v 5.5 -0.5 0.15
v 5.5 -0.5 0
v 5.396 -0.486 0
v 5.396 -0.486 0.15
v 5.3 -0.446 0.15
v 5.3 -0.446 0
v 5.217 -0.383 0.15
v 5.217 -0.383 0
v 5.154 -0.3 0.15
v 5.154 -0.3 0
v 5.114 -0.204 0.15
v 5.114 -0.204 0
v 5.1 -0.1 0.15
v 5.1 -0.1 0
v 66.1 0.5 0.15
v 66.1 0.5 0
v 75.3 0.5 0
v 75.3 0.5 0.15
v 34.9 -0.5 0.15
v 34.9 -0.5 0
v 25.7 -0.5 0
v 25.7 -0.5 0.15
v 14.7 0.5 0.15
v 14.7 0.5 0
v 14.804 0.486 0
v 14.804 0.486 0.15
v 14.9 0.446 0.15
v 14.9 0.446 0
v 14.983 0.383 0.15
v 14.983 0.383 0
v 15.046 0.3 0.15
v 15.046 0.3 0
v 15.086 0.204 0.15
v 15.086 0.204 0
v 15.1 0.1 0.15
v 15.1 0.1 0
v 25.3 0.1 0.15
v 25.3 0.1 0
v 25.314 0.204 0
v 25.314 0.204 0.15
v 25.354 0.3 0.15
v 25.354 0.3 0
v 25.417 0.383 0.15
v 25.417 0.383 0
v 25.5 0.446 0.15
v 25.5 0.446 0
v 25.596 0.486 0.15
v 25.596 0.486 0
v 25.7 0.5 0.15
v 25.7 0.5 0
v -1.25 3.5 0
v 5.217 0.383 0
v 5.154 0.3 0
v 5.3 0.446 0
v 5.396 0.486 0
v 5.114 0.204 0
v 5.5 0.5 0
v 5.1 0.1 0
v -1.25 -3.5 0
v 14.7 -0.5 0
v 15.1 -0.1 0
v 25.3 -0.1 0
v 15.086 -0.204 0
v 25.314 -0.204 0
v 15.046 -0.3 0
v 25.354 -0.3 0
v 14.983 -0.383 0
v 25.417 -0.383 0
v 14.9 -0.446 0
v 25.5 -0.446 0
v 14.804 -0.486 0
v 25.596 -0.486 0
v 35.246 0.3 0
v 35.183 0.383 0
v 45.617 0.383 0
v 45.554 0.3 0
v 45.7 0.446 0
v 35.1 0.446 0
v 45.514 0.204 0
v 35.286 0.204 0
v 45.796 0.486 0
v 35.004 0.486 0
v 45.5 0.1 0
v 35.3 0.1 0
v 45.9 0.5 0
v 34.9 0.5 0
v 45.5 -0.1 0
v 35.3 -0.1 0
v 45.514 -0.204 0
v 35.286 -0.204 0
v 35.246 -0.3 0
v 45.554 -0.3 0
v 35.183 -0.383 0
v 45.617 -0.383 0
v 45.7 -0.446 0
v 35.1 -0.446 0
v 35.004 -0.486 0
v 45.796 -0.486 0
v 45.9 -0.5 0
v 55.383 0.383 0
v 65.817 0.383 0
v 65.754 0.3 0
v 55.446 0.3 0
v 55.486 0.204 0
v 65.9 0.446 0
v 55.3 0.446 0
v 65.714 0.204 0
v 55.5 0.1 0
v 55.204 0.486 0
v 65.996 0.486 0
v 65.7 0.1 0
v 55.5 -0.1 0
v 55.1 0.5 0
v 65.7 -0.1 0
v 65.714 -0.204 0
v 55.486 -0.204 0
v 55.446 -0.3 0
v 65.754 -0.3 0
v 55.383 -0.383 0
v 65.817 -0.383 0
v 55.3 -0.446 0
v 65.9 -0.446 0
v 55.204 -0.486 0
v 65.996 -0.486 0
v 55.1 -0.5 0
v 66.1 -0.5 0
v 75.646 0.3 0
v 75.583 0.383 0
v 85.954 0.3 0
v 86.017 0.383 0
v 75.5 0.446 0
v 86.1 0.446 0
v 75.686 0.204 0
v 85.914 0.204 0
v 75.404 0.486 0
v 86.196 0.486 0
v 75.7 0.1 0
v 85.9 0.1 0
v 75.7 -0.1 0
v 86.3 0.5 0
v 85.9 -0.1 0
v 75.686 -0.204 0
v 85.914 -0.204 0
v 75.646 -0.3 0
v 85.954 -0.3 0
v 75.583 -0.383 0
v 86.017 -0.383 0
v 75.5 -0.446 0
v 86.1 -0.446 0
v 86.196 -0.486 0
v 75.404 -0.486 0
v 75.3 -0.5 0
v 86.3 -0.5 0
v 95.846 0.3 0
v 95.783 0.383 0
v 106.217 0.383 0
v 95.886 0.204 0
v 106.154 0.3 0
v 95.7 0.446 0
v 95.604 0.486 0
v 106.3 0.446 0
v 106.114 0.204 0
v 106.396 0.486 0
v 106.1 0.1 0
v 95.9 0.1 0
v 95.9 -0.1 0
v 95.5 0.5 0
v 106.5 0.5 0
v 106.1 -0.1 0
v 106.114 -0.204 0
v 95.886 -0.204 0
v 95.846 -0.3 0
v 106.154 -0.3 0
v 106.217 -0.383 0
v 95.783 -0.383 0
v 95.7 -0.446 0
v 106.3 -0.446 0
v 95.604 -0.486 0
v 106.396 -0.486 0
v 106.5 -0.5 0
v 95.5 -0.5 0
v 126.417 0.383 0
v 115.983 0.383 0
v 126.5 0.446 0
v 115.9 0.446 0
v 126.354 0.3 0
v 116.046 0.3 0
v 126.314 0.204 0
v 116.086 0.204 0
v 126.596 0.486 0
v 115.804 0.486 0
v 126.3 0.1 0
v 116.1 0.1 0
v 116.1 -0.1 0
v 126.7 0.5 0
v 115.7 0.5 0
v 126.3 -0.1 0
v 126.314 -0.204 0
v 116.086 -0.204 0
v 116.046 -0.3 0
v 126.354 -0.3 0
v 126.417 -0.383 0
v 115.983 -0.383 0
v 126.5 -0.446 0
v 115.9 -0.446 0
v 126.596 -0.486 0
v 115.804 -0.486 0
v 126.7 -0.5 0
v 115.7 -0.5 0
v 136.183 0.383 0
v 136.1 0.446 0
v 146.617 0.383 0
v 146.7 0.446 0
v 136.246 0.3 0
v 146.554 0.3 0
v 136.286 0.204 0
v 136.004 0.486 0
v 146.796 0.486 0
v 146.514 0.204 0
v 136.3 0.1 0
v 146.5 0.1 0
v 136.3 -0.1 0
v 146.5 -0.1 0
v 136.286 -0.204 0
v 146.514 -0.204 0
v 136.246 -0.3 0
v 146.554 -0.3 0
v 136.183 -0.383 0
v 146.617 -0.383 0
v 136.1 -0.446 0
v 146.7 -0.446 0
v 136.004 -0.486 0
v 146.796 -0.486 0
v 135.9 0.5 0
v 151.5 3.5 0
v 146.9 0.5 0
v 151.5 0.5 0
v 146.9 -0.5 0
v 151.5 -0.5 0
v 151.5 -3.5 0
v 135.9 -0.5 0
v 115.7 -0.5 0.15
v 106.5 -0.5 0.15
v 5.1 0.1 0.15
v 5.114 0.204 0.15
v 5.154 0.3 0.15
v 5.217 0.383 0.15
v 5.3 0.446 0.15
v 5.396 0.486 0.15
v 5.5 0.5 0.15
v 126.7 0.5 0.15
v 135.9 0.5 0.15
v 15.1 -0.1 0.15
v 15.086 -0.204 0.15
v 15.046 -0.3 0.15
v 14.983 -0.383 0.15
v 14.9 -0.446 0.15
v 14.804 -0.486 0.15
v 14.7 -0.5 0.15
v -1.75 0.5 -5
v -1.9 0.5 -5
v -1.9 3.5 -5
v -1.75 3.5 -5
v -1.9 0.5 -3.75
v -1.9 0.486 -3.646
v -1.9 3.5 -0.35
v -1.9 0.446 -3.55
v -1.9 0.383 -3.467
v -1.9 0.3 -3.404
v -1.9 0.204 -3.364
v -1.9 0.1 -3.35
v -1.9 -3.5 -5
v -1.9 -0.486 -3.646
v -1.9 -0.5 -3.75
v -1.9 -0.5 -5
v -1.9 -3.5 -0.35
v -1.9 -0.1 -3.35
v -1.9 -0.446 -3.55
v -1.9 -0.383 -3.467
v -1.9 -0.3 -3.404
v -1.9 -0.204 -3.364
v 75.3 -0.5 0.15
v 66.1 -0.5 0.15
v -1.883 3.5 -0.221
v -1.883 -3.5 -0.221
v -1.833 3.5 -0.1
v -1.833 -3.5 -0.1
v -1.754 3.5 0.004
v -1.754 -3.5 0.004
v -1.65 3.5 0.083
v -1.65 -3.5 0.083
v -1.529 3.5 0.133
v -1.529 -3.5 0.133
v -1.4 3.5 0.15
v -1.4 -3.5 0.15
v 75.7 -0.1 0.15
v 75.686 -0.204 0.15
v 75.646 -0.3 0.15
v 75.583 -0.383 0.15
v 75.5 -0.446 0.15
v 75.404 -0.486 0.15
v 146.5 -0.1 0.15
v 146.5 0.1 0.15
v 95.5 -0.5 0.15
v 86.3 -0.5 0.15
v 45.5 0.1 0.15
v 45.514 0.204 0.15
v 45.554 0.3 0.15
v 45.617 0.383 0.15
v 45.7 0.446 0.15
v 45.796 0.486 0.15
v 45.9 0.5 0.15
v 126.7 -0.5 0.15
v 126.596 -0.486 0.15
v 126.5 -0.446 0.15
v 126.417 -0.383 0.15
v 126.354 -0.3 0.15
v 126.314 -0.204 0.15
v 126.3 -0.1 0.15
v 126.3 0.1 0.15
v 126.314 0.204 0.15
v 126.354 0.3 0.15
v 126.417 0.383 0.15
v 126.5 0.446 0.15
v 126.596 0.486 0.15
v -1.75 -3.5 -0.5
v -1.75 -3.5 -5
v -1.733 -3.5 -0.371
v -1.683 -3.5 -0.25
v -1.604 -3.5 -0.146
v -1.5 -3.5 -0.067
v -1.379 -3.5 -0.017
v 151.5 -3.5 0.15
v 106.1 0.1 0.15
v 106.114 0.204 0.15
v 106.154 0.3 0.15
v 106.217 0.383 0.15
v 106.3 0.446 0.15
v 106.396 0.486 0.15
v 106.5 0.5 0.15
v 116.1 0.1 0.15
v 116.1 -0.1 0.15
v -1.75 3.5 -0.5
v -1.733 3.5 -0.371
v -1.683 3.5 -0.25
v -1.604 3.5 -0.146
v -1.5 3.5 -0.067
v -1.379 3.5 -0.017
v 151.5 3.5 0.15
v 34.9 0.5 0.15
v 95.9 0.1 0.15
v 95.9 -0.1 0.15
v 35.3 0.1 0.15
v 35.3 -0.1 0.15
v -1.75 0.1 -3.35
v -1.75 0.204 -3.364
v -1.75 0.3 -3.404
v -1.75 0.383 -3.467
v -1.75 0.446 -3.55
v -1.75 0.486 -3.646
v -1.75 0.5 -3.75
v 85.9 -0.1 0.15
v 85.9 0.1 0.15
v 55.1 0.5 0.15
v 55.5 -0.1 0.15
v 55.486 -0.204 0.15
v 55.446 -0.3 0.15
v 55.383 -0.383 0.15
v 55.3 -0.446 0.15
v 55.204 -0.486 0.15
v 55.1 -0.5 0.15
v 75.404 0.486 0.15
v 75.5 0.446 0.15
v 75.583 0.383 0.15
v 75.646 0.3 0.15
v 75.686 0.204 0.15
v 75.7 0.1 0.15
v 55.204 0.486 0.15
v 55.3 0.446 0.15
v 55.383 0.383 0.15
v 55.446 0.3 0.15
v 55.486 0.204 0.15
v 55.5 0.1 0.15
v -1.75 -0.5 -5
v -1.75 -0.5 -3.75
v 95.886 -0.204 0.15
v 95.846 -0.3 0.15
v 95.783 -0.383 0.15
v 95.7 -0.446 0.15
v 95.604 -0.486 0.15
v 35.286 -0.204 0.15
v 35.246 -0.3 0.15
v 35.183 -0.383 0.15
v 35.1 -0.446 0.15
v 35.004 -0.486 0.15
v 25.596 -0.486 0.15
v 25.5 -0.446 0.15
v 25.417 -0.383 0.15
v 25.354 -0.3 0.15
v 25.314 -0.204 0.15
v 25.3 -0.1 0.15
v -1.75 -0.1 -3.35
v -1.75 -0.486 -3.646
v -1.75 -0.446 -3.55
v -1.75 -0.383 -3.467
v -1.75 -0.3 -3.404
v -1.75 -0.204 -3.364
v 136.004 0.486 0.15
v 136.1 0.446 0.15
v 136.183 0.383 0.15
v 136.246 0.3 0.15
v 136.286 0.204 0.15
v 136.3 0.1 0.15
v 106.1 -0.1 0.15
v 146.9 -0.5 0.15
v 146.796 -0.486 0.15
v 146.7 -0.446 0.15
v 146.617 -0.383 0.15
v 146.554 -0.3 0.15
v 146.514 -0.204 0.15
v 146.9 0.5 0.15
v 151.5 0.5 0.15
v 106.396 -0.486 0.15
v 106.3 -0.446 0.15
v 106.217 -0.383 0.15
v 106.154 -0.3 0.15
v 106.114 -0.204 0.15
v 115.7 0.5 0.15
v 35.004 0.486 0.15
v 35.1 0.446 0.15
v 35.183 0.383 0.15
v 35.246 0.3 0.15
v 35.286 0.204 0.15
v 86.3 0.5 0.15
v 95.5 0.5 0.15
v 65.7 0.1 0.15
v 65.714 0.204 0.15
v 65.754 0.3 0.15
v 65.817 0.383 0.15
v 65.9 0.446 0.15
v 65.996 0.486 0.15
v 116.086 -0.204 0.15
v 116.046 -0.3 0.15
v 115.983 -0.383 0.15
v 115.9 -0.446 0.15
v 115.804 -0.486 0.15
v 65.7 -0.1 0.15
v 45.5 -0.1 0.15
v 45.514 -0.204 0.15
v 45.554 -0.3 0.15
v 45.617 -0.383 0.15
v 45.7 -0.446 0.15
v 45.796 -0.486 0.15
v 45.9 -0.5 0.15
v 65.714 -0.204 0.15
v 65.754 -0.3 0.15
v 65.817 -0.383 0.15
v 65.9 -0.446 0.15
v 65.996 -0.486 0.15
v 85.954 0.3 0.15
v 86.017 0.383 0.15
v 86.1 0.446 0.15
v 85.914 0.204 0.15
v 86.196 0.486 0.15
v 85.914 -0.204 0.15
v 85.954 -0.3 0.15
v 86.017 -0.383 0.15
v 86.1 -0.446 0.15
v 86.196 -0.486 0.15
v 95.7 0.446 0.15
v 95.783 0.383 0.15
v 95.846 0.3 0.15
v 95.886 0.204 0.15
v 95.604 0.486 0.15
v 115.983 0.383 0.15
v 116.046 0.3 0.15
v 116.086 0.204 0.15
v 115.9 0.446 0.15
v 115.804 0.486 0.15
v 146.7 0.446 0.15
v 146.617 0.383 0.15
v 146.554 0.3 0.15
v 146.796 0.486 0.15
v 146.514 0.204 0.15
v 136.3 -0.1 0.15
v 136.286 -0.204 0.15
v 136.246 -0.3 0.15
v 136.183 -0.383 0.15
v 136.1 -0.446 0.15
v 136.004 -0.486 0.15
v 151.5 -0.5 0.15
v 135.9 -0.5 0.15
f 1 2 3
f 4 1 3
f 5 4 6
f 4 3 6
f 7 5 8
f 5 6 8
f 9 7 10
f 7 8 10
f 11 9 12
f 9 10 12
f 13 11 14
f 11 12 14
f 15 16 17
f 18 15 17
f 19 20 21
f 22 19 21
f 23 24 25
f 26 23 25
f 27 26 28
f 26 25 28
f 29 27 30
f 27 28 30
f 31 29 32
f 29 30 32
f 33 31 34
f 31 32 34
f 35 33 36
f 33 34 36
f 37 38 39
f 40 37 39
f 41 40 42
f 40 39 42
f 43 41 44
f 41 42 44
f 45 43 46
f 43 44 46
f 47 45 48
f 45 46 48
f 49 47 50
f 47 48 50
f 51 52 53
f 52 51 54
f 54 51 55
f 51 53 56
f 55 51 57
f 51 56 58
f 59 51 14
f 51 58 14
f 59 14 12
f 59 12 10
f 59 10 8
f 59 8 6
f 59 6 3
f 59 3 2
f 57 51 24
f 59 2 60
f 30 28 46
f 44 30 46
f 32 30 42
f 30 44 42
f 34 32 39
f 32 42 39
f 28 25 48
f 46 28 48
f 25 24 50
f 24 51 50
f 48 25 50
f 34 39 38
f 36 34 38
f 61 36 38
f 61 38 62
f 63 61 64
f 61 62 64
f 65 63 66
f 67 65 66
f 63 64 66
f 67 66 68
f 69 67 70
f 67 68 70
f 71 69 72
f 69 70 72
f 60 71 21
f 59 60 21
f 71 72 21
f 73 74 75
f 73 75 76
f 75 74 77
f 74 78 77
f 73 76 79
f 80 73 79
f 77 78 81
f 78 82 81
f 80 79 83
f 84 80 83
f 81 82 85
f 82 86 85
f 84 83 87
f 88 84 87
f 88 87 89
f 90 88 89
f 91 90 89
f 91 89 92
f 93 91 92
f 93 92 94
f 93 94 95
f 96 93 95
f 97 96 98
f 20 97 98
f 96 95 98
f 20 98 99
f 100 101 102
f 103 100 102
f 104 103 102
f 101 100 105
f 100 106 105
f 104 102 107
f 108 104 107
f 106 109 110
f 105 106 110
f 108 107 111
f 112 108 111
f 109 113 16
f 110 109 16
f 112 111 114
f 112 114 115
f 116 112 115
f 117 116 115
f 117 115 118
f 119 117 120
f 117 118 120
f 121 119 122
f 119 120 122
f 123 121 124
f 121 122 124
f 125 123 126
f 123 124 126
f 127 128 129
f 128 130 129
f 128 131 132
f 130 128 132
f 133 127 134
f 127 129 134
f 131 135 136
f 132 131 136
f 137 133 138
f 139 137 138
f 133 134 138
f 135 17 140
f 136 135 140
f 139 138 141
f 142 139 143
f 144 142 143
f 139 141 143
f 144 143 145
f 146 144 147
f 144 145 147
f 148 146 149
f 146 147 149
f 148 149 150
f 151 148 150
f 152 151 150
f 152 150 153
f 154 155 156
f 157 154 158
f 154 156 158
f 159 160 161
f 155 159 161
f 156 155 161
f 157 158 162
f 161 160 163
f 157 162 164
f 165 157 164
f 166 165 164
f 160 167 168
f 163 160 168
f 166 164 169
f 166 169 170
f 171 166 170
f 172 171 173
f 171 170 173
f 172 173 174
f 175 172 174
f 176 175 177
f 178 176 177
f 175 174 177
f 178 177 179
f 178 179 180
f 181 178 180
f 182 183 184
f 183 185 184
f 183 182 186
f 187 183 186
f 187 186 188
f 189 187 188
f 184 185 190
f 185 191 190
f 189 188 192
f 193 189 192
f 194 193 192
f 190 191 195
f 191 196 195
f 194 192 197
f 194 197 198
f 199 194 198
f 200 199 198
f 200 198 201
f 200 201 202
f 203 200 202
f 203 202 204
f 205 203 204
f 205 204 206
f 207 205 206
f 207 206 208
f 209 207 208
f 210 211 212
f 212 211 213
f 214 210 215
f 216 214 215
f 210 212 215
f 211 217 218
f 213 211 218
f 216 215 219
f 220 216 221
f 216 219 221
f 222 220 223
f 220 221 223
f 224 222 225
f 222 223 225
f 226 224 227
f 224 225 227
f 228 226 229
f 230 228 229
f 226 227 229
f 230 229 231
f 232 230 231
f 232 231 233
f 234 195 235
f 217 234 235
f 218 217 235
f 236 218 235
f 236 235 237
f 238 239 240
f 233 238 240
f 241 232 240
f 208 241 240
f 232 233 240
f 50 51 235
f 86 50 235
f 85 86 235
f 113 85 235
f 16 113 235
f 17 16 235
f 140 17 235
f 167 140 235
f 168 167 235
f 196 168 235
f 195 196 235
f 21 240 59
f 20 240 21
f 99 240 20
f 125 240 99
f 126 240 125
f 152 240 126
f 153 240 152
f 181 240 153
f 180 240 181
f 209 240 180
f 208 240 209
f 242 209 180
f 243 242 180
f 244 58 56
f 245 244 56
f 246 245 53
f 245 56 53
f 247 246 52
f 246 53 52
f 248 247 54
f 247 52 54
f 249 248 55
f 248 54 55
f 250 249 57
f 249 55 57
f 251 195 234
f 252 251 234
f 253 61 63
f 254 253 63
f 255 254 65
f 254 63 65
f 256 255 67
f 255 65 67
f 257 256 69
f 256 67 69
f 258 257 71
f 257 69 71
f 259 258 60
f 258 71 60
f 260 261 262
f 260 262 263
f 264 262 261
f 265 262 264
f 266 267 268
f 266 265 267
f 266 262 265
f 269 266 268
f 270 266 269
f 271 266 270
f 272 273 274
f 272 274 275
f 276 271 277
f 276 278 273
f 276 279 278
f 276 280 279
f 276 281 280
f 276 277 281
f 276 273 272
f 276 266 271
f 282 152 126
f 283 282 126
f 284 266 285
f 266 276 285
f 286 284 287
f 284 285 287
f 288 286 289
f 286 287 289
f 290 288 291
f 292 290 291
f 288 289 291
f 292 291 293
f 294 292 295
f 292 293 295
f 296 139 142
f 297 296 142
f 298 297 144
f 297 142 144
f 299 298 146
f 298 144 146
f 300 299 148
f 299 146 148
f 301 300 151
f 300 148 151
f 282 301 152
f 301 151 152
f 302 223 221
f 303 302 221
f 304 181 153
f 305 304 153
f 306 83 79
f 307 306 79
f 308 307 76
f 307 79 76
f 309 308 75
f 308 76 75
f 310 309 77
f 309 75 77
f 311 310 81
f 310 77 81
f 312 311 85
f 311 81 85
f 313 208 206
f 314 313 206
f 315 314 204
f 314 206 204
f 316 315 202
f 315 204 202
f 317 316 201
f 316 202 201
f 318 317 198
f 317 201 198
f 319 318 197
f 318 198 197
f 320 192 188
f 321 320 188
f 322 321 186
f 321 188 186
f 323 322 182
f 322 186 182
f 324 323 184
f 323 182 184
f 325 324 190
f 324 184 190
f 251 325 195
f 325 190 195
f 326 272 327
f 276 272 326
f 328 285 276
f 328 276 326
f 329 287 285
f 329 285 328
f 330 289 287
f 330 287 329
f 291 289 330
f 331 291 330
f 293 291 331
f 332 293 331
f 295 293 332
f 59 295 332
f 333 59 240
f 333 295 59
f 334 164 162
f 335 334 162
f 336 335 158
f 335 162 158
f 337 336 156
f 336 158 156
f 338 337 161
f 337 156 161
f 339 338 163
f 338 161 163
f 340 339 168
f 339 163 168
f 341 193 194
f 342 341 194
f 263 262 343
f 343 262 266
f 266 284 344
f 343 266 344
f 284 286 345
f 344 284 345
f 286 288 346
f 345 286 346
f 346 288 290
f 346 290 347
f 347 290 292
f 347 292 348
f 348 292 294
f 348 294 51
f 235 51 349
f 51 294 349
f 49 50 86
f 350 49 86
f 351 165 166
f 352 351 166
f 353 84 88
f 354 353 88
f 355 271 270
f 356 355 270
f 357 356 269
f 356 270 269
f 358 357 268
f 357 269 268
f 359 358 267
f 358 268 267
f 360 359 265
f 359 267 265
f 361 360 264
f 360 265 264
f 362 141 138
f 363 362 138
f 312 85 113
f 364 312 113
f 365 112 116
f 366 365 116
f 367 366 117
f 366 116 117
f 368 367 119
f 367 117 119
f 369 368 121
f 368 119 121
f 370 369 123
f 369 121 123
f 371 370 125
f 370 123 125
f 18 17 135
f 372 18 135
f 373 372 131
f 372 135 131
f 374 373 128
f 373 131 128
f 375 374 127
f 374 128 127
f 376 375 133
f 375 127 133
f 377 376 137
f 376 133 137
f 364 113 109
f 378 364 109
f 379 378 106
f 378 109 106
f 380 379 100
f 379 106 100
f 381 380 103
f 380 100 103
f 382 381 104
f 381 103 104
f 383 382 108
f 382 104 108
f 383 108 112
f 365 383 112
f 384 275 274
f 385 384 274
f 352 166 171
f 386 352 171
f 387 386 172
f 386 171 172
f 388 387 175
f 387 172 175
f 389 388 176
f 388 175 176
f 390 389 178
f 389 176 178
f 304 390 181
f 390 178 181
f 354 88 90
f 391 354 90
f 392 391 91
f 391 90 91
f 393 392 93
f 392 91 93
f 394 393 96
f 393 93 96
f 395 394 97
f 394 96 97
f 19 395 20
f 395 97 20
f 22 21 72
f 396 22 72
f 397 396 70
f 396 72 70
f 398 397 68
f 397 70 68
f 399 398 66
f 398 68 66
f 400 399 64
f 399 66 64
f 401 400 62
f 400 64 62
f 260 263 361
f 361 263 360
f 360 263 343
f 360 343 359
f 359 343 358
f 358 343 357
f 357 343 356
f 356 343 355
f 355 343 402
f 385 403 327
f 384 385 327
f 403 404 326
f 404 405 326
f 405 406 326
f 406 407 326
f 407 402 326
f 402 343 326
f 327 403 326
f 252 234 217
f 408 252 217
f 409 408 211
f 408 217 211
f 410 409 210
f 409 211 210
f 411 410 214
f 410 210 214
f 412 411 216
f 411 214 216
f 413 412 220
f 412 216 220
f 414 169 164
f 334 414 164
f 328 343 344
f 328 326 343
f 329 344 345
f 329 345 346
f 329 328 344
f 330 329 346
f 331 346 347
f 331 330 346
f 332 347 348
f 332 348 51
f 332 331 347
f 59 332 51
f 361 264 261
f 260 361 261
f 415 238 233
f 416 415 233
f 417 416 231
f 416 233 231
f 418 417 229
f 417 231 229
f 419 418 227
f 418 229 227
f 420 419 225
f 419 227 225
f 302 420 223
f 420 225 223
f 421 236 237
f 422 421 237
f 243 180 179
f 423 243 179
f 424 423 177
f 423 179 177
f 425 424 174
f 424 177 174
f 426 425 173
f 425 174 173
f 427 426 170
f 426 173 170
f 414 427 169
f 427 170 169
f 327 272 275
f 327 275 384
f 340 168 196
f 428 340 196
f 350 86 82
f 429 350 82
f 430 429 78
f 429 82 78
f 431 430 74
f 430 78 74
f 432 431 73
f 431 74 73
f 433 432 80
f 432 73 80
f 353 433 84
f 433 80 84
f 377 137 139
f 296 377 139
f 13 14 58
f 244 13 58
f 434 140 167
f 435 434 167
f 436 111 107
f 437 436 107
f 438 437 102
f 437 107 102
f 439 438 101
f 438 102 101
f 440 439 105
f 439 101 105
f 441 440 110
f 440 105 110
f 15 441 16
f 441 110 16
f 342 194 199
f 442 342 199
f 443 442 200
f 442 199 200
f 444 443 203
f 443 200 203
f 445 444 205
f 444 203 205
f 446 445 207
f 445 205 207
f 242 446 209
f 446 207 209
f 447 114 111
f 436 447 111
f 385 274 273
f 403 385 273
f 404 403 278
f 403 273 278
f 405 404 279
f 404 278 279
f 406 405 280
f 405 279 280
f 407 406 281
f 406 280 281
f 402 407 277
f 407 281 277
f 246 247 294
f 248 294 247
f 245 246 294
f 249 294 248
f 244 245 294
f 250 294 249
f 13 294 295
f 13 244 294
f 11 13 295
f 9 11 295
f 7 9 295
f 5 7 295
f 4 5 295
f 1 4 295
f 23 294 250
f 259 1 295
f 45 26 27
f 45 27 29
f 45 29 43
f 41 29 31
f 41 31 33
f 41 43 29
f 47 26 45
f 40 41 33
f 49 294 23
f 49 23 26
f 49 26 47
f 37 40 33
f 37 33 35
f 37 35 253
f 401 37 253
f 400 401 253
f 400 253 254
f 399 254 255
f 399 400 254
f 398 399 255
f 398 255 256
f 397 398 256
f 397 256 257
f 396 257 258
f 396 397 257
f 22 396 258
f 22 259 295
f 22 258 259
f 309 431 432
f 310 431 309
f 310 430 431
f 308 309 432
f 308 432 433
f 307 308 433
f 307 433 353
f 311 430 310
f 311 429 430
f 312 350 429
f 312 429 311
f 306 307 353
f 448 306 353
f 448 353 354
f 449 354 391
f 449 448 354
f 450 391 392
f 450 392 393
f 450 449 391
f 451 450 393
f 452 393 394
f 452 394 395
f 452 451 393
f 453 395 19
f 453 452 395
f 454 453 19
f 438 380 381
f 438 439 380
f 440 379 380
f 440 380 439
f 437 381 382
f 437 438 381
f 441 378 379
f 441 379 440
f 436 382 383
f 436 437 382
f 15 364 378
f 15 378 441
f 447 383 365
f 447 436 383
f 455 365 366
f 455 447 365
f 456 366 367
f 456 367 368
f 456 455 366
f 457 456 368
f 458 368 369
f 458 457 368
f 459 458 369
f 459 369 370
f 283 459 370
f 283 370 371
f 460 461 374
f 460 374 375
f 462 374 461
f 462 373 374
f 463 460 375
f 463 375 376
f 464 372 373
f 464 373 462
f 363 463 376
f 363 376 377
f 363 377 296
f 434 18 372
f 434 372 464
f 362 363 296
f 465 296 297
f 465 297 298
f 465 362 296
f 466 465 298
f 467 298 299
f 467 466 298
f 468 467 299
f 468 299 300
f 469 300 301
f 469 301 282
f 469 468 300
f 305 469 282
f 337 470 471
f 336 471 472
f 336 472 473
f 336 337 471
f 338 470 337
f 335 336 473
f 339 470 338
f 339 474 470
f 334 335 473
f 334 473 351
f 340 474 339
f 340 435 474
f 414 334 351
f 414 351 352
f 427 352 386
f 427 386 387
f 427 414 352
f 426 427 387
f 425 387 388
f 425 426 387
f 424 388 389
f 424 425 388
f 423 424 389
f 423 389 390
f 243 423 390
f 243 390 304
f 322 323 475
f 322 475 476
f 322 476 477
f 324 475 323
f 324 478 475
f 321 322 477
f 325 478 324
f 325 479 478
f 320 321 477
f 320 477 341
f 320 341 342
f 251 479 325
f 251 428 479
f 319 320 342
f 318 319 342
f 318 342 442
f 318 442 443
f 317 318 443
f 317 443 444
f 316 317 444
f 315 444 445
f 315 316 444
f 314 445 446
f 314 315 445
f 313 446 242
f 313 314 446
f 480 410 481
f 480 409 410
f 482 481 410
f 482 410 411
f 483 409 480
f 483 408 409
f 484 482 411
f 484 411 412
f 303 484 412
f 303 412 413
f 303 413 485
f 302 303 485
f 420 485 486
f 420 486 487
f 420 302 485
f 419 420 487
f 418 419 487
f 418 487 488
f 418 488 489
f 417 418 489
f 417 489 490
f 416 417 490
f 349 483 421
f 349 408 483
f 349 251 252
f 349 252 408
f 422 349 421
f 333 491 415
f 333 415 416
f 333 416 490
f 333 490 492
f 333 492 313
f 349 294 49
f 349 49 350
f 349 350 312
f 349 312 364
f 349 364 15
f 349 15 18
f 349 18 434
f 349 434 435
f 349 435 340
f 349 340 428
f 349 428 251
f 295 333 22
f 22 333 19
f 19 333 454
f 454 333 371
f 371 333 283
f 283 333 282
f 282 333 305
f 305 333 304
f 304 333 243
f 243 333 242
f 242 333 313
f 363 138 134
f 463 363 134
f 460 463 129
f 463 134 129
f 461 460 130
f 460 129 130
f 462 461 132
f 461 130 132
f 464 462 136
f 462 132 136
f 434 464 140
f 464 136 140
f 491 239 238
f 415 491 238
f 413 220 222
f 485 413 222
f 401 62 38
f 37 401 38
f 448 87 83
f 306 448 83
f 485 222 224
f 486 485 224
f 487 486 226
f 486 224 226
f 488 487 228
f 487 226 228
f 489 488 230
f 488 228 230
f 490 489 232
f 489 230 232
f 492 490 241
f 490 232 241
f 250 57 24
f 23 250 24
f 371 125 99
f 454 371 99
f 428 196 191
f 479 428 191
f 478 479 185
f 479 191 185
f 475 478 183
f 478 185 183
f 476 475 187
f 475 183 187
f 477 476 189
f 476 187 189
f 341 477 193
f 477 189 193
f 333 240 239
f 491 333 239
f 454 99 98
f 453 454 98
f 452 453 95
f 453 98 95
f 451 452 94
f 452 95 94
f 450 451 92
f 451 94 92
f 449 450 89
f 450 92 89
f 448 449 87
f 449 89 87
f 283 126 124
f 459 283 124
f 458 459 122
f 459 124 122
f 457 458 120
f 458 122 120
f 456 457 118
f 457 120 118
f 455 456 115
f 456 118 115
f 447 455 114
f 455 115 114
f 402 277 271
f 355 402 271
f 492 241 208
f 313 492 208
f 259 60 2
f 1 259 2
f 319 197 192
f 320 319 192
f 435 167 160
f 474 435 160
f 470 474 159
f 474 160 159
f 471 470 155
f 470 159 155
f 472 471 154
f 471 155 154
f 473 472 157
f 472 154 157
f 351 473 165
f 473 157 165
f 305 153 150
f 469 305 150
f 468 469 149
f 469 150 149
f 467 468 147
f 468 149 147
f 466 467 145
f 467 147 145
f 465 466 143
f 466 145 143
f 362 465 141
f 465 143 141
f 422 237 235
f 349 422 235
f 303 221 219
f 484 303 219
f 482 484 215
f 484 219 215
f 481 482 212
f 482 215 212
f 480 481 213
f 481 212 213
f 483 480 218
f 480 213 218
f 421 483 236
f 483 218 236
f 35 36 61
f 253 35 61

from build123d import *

# Parameters (mm, degrees)
F0_W     = 3
F0_H     = 3
F1_DEPTH = 0.15
F2_DEPTH = 1.9
F3_W     = 0.15
F3_H     = 7
F4_DEPTH = 5
F6_DEPTH = 25
F7_R     = 0.5


with BuildPart() as f1:
    # F0 (on Top) → F1 (new body)
    with BuildSketch(Plane.XY):
        with Locations((72.2, 2)):
            Rectangle(F0_W, F0_H)
        with BuildLine():
            Line((10.1, -0.5), (10.1, -3.5))
            Line((10.1, -3.5), (20.2, -3.5))
            Line((20.2, -3.5), (30.3, -3.5))
            Line((30.3, -3.5), (30.3, -0.5))
            Line((30.3, -0.5), (25.7, -0.5))
            ThreePointArc((25.7, -0.5), (25.4171572875, -0.3828427125), (25.3, -0.1))
            Line((25.3, -0.1), (25.3, 0.1))
            ThreePointArc((25.3, 0.1), (25.4171572875, 0.3828427125), (25.7, 0.5))
            Line((25.7, 0.5), (30.3, 0.5))
            Line((30.3, 0.5), (30.3, 3.5))
            Line((30.3, 3.5), (20.2, 3.5))
            Line((20.2, 3.5), (10.1, 3.5))
            Line((10.1, 3.5), (10.1, 0.5))
            Line((10.1, 0.5), (14.7, 0.5))
            ThreePointArc((14.7, 0.5), (14.9828427125, 0.3828427125), (15.1, 0.1))
            Line((15.1, 0.1), (15.1, -0.1))
            ThreePointArc((15.1, -0.1), (14.9828427125, -0.3828427125), (14.7, -0.5))
            Line((14.7, -0.5), (10.1, -0.5))
        make_face()
        with BuildLine():
            Line((30.3, -0.5), (30.3, -3.5))
            Line((30.3, -3.5), (40.4, -3.5))
            Line((40.4, -3.5), (50.5, -3.5))
            Line((50.5, -3.5), (50.5, -0.5))
            Line((50.5, -0.5), (45.9, -0.5))
            ThreePointArc((45.9, -0.5), (45.6171572875, -0.3828427125), (45.5, -0.1))
            Line((45.5, -0.1), (45.5, 0.1))
            ThreePointArc((45.5, 0.1), (45.6171572875, 0.3828427125), (45.9, 0.5))
            Line((45.9, 0.5), (50.5, 0.5))
            Line((50.5, 0.5), (50.5, 3.5))
            Line((50.5, 3.5), (40.4, 3.5))
            Line((40.4, 3.5), (30.3, 3.5))
            Line((30.3, 3.5), (30.3, 0.5))
            Line((30.3, 0.5), (34.9, 0.5))
            ThreePointArc((34.9, 0.5), (35.1828427125, 0.3828427125), (35.3, 0.1))
            Line((35.3, 0.1), (35.3, -0.1))
            ThreePointArc((35.3, -0.1), (35.1828427125, -0.3828427125), (34.9, -0.5))
            Line((34.9, -0.5), (30.3, -0.5))
        make_face()
        with BuildLine():
            Line((50.5, -0.5), (50.5, -3.5))
            Line((50.5, -3.5), (60.6, -3.5))
            Line((60.6, -3.5), (70.7, -3.5))
            Line((70.7, -3.5), (70.7, -0.5))
            Line((70.7, -0.5), (66.1, -0.5))
            ThreePointArc((66.1, -0.5), (65.8171572875, -0.3828427125), (65.7, -0.1))
            Line((65.7, -0.1), (65.7, 0.1))
            ThreePointArc((65.7, 0.1), (65.8171572875, 0.3828427125), (66.1, 0.5))
            Line((66.1, 0.5), (70.7, 0.5))
            Line((70.7, 0.5), (70.7, 3.5))
            Line((70.7, 3.5), (60.6, 3.5))
            Line((60.6, 3.5), (50.5, 3.5))
            Line((50.5, 3.5), (50.5, 0.5))
            Line((50.5, 0.5), (55.1, 0.5))
            ThreePointArc((55.1, 0.5), (55.3828427125, 0.3828427125), (55.5, 0.1))
            Line((55.5, 0.1), (55.5, -0.1))
            ThreePointArc((55.5, -0.1), (55.3828427125, -0.3828427125), (55.1, -0.5))
            Line((55.1, -0.5), (50.5, -0.5))
        make_face()
        with BuildLine():
            Line((0, 3.5), (0, -3.5))
            Line((0, -3.5), (10.1, -3.5))
            Line((10.1, -3.5), (10.1, -0.5))
            Line((10.1, -0.5), (5.5, -0.5))
            ThreePointArc((5.5, -0.5), (5.2171572875, -0.3828427125), (5.1, -0.1))
            Line((5.1, -0.1), (5.1, 0.1))
            ThreePointArc((5.1, 0.1), (5.2171572875, 0.3828427125), (5.5, 0.5))
            Line((5.5, 0.5), (10.1, 0.5))
            Line((10.1, 0.5), (10.1, 3.5))
            Line((10.1, 3.5), (0, 3.5))
        make_face()
        with Locations((72.2, -2)):
            Rectangle(F0_W, F0_H)
        with BuildLine():
            Line((73.7, -0.5), (73.7, -3.5))
            Line((73.7, -3.5), (80.8, -3.5))
            Line((80.8, -3.5), (90.9, -3.5))
            Line((90.9, -3.5), (90.9, -0.5))
            Line((90.9, -0.5), (86.3, -0.5))
            ThreePointArc((86.3, -0.5), (86.0171572875, -0.3828427125), (85.9, -0.1))
            Line((85.9, -0.1), (85.9, 0.1))
            ThreePointArc((85.9, 0.1), (86.0171572875, 0.3828427125), (86.3, 0.5))
            Line((86.3, 0.5), (90.9, 0.5))
            Line((90.9, 0.5), (90.9, 3.5))
            Line((90.9, 3.5), (80.8, 3.5))
            Line((80.8, 3.5), (73.7, 3.5))
            Line((73.7, 3.5), (73.7, 0.5))
            Line((73.7, 0.5), (75.3, 0.5))
            ThreePointArc((75.3, 0.5), (75.5828427125, 0.3828427125), (75.7, 0.1))
            Line((75.7, 0.1), (75.7, -0.1))
            ThreePointArc((75.7, -0.1), (75.5828427125, -0.3828427125), (75.3, -0.5))
            Line((75.3, -0.5), (73.7, -0.5))
        make_face()
        with BuildLine():
            Line((90.9, -0.5), (90.9, -3.5))
            Line((90.9, -3.5), (101, -3.5))
            Line((101, -3.5), (111.1, -3.5))
            Line((111.1, -3.5), (111.1, -0.5))
            Line((111.1, -0.5), (106.5, -0.5))
            ThreePointArc((106.5, -0.5), (106.2171572875, -0.3828427125), (106.1, -0.1))
            Line((106.1, -0.1), (106.1, 0.1))
            ThreePointArc((106.1, 0.1), (106.2171572875, 0.3828427125), (106.5, 0.5))
            Line((106.5, 0.5), (111.1, 0.5))
            Line((111.1, 0.5), (111.1, 3.5))
            Line((111.1, 3.5), (101, 3.5))
            Line((101, 3.5), (90.9, 3.5))
            Line((90.9, 3.5), (90.9, 0.5))
            Line((90.9, 0.5), (95.5, 0.5))
            ThreePointArc((95.5, 0.5), (95.7828427125, 0.3828427125), (95.9, 0.1))
            Line((95.9, 0.1), (95.9, -0.1))
            ThreePointArc((95.9, -0.1), (95.7828427125, -0.3828427125), (95.5, -0.5))
            Line((95.5, -0.5), (90.9, -0.5))
        make_face()
        with BuildLine():
            Line((111.1, -0.5), (111.1, -3.5))
            Line((111.1, -3.5), (121.2, -3.5))
            Line((121.2, -3.5), (131.3, -3.5))
            Line((131.3, -3.5), (131.3, -0.5))
            Line((131.3, -0.5), (126.7, -0.5))
            ThreePointArc((126.7, -0.5), (126.4171572875, -0.3828427125), (126.3, -0.1))
            Line((126.3, -0.1), (126.3, 0.1))
            ThreePointArc((126.3, 0.1), (126.4171572875, 0.3828427125), (126.7, 0.5))
            Line((126.7, 0.5), (131.3, 0.5))
            Line((131.3, 0.5), (131.3, 3.5))
            Line((131.3, 3.5), (121.2, 3.5))
            Line((121.2, 3.5), (111.1, 3.5))
            Line((111.1, 3.5), (111.1, 0.5))
            Line((111.1, 0.5), (115.7, 0.5))
            ThreePointArc((115.7, 0.5), (115.9828427125, 0.3828427125), (116.1, 0.1))
            Line((116.1, 0.1), (116.1, -0.1))
            ThreePointArc((116.1, -0.1), (115.9828427125, -0.3828427125), (115.7, -0.5))
            Line((115.7, -0.5), (111.1, -0.5))
        make_face()
        with BuildLine():
            Line((131.3, -0.5), (131.3, -3.5))
            Line((131.3, -3.5), (141.4, -3.5))
            Line((141.4, -3.5), (151.5, -3.5))
            Line((151.5, -3.5), (151.5, -0.5))
            Line((151.5, -0.5), (146.9, -0.5))
            ThreePointArc((146.9, -0.5), (146.6171572875, -0.3828427125), (146.5, -0.1))
            Line((146.5, -0.1), (146.5, 0.1))
            ThreePointArc((146.5, 0.1), (146.6171572875, 0.3828427125), (146.9, 0.5))
            Line((146.9, 0.5), (151.5, 0.5))
            Line((151.5, 0.5), (151.5, 3.5))
            Line((151.5, 3.5), (141.4, 3.5))
            Line((141.4, 3.5), (131.3, 3.5))
            Line((131.3, 3.5), (131.3, 0.5))
            Line((131.3, 0.5), (135.9, 0.5))
            ThreePointArc((135.9, 0.5), (136.1828427125, 0.3828427125), (136.3, 0.1))
            Line((136.3, 0.1), (136.3, -0.1))
            ThreePointArc((136.3, -0.1), (136.1828427125, -0.3828427125), (135.9, -0.5))
            Line((135.9, -0.5), (131.3, -0.5))
        make_face()
    extrude(amount=F1_DEPTH)

    # F2 (add): a face of the model
    f2_faces = [f1.faces().sort_by_distance(p)[0] for p in [
        (0, 0, 0.075),
    ]]
    extrude(f2_faces, amount=F2_DEPTH)

    # F3 (on face) → F4 (join)
    with BuildSketch(Plane(origin=(0, 0, 0), x_dir=(1, 0, 0), z_dir=(0, 0, -1))):
        with Locations((-1.825, 0)):
            Rectangle(F3_W, F3_H)
    extrude(amount=F4_DEPTH)

    # F5 (on face) → F6 (cut)
    with BuildSketch(Plane(origin=(-1.9, 0, 0), x_dir=(0, -1, 0), z_dir=(-1, 0, 0))):
        with BuildLine():
            ThreePointArc((0.5, -3.75), (0.3828427125, -3.4671572875), (0.1, -3.35))
            Line((0.1, -3.35), (-0.1, -3.35))
            ThreePointArc((-0.1, -3.35), (-0.3828427125, -3.4671572875), (-0.5, -3.75))
            Line((-0.5, -3.75), (-0.5, -5))
            Line((-0.5, -5), (0.5, -5))
            Line((0.5, -5), (0.5, -3.75))
        make_face()
    extrude(amount=-F6_DEPTH, mode=Mode.SUBTRACT)

    # F7
    f7_edges = [f1.edges().sort_by_distance(p)[0] for p in [
        (-1.9, 0, 0.15),
        (-1.75, 0, 0),
    ]]
    fillet(f7_edges, radius=F7_R)


solid = f1.part
